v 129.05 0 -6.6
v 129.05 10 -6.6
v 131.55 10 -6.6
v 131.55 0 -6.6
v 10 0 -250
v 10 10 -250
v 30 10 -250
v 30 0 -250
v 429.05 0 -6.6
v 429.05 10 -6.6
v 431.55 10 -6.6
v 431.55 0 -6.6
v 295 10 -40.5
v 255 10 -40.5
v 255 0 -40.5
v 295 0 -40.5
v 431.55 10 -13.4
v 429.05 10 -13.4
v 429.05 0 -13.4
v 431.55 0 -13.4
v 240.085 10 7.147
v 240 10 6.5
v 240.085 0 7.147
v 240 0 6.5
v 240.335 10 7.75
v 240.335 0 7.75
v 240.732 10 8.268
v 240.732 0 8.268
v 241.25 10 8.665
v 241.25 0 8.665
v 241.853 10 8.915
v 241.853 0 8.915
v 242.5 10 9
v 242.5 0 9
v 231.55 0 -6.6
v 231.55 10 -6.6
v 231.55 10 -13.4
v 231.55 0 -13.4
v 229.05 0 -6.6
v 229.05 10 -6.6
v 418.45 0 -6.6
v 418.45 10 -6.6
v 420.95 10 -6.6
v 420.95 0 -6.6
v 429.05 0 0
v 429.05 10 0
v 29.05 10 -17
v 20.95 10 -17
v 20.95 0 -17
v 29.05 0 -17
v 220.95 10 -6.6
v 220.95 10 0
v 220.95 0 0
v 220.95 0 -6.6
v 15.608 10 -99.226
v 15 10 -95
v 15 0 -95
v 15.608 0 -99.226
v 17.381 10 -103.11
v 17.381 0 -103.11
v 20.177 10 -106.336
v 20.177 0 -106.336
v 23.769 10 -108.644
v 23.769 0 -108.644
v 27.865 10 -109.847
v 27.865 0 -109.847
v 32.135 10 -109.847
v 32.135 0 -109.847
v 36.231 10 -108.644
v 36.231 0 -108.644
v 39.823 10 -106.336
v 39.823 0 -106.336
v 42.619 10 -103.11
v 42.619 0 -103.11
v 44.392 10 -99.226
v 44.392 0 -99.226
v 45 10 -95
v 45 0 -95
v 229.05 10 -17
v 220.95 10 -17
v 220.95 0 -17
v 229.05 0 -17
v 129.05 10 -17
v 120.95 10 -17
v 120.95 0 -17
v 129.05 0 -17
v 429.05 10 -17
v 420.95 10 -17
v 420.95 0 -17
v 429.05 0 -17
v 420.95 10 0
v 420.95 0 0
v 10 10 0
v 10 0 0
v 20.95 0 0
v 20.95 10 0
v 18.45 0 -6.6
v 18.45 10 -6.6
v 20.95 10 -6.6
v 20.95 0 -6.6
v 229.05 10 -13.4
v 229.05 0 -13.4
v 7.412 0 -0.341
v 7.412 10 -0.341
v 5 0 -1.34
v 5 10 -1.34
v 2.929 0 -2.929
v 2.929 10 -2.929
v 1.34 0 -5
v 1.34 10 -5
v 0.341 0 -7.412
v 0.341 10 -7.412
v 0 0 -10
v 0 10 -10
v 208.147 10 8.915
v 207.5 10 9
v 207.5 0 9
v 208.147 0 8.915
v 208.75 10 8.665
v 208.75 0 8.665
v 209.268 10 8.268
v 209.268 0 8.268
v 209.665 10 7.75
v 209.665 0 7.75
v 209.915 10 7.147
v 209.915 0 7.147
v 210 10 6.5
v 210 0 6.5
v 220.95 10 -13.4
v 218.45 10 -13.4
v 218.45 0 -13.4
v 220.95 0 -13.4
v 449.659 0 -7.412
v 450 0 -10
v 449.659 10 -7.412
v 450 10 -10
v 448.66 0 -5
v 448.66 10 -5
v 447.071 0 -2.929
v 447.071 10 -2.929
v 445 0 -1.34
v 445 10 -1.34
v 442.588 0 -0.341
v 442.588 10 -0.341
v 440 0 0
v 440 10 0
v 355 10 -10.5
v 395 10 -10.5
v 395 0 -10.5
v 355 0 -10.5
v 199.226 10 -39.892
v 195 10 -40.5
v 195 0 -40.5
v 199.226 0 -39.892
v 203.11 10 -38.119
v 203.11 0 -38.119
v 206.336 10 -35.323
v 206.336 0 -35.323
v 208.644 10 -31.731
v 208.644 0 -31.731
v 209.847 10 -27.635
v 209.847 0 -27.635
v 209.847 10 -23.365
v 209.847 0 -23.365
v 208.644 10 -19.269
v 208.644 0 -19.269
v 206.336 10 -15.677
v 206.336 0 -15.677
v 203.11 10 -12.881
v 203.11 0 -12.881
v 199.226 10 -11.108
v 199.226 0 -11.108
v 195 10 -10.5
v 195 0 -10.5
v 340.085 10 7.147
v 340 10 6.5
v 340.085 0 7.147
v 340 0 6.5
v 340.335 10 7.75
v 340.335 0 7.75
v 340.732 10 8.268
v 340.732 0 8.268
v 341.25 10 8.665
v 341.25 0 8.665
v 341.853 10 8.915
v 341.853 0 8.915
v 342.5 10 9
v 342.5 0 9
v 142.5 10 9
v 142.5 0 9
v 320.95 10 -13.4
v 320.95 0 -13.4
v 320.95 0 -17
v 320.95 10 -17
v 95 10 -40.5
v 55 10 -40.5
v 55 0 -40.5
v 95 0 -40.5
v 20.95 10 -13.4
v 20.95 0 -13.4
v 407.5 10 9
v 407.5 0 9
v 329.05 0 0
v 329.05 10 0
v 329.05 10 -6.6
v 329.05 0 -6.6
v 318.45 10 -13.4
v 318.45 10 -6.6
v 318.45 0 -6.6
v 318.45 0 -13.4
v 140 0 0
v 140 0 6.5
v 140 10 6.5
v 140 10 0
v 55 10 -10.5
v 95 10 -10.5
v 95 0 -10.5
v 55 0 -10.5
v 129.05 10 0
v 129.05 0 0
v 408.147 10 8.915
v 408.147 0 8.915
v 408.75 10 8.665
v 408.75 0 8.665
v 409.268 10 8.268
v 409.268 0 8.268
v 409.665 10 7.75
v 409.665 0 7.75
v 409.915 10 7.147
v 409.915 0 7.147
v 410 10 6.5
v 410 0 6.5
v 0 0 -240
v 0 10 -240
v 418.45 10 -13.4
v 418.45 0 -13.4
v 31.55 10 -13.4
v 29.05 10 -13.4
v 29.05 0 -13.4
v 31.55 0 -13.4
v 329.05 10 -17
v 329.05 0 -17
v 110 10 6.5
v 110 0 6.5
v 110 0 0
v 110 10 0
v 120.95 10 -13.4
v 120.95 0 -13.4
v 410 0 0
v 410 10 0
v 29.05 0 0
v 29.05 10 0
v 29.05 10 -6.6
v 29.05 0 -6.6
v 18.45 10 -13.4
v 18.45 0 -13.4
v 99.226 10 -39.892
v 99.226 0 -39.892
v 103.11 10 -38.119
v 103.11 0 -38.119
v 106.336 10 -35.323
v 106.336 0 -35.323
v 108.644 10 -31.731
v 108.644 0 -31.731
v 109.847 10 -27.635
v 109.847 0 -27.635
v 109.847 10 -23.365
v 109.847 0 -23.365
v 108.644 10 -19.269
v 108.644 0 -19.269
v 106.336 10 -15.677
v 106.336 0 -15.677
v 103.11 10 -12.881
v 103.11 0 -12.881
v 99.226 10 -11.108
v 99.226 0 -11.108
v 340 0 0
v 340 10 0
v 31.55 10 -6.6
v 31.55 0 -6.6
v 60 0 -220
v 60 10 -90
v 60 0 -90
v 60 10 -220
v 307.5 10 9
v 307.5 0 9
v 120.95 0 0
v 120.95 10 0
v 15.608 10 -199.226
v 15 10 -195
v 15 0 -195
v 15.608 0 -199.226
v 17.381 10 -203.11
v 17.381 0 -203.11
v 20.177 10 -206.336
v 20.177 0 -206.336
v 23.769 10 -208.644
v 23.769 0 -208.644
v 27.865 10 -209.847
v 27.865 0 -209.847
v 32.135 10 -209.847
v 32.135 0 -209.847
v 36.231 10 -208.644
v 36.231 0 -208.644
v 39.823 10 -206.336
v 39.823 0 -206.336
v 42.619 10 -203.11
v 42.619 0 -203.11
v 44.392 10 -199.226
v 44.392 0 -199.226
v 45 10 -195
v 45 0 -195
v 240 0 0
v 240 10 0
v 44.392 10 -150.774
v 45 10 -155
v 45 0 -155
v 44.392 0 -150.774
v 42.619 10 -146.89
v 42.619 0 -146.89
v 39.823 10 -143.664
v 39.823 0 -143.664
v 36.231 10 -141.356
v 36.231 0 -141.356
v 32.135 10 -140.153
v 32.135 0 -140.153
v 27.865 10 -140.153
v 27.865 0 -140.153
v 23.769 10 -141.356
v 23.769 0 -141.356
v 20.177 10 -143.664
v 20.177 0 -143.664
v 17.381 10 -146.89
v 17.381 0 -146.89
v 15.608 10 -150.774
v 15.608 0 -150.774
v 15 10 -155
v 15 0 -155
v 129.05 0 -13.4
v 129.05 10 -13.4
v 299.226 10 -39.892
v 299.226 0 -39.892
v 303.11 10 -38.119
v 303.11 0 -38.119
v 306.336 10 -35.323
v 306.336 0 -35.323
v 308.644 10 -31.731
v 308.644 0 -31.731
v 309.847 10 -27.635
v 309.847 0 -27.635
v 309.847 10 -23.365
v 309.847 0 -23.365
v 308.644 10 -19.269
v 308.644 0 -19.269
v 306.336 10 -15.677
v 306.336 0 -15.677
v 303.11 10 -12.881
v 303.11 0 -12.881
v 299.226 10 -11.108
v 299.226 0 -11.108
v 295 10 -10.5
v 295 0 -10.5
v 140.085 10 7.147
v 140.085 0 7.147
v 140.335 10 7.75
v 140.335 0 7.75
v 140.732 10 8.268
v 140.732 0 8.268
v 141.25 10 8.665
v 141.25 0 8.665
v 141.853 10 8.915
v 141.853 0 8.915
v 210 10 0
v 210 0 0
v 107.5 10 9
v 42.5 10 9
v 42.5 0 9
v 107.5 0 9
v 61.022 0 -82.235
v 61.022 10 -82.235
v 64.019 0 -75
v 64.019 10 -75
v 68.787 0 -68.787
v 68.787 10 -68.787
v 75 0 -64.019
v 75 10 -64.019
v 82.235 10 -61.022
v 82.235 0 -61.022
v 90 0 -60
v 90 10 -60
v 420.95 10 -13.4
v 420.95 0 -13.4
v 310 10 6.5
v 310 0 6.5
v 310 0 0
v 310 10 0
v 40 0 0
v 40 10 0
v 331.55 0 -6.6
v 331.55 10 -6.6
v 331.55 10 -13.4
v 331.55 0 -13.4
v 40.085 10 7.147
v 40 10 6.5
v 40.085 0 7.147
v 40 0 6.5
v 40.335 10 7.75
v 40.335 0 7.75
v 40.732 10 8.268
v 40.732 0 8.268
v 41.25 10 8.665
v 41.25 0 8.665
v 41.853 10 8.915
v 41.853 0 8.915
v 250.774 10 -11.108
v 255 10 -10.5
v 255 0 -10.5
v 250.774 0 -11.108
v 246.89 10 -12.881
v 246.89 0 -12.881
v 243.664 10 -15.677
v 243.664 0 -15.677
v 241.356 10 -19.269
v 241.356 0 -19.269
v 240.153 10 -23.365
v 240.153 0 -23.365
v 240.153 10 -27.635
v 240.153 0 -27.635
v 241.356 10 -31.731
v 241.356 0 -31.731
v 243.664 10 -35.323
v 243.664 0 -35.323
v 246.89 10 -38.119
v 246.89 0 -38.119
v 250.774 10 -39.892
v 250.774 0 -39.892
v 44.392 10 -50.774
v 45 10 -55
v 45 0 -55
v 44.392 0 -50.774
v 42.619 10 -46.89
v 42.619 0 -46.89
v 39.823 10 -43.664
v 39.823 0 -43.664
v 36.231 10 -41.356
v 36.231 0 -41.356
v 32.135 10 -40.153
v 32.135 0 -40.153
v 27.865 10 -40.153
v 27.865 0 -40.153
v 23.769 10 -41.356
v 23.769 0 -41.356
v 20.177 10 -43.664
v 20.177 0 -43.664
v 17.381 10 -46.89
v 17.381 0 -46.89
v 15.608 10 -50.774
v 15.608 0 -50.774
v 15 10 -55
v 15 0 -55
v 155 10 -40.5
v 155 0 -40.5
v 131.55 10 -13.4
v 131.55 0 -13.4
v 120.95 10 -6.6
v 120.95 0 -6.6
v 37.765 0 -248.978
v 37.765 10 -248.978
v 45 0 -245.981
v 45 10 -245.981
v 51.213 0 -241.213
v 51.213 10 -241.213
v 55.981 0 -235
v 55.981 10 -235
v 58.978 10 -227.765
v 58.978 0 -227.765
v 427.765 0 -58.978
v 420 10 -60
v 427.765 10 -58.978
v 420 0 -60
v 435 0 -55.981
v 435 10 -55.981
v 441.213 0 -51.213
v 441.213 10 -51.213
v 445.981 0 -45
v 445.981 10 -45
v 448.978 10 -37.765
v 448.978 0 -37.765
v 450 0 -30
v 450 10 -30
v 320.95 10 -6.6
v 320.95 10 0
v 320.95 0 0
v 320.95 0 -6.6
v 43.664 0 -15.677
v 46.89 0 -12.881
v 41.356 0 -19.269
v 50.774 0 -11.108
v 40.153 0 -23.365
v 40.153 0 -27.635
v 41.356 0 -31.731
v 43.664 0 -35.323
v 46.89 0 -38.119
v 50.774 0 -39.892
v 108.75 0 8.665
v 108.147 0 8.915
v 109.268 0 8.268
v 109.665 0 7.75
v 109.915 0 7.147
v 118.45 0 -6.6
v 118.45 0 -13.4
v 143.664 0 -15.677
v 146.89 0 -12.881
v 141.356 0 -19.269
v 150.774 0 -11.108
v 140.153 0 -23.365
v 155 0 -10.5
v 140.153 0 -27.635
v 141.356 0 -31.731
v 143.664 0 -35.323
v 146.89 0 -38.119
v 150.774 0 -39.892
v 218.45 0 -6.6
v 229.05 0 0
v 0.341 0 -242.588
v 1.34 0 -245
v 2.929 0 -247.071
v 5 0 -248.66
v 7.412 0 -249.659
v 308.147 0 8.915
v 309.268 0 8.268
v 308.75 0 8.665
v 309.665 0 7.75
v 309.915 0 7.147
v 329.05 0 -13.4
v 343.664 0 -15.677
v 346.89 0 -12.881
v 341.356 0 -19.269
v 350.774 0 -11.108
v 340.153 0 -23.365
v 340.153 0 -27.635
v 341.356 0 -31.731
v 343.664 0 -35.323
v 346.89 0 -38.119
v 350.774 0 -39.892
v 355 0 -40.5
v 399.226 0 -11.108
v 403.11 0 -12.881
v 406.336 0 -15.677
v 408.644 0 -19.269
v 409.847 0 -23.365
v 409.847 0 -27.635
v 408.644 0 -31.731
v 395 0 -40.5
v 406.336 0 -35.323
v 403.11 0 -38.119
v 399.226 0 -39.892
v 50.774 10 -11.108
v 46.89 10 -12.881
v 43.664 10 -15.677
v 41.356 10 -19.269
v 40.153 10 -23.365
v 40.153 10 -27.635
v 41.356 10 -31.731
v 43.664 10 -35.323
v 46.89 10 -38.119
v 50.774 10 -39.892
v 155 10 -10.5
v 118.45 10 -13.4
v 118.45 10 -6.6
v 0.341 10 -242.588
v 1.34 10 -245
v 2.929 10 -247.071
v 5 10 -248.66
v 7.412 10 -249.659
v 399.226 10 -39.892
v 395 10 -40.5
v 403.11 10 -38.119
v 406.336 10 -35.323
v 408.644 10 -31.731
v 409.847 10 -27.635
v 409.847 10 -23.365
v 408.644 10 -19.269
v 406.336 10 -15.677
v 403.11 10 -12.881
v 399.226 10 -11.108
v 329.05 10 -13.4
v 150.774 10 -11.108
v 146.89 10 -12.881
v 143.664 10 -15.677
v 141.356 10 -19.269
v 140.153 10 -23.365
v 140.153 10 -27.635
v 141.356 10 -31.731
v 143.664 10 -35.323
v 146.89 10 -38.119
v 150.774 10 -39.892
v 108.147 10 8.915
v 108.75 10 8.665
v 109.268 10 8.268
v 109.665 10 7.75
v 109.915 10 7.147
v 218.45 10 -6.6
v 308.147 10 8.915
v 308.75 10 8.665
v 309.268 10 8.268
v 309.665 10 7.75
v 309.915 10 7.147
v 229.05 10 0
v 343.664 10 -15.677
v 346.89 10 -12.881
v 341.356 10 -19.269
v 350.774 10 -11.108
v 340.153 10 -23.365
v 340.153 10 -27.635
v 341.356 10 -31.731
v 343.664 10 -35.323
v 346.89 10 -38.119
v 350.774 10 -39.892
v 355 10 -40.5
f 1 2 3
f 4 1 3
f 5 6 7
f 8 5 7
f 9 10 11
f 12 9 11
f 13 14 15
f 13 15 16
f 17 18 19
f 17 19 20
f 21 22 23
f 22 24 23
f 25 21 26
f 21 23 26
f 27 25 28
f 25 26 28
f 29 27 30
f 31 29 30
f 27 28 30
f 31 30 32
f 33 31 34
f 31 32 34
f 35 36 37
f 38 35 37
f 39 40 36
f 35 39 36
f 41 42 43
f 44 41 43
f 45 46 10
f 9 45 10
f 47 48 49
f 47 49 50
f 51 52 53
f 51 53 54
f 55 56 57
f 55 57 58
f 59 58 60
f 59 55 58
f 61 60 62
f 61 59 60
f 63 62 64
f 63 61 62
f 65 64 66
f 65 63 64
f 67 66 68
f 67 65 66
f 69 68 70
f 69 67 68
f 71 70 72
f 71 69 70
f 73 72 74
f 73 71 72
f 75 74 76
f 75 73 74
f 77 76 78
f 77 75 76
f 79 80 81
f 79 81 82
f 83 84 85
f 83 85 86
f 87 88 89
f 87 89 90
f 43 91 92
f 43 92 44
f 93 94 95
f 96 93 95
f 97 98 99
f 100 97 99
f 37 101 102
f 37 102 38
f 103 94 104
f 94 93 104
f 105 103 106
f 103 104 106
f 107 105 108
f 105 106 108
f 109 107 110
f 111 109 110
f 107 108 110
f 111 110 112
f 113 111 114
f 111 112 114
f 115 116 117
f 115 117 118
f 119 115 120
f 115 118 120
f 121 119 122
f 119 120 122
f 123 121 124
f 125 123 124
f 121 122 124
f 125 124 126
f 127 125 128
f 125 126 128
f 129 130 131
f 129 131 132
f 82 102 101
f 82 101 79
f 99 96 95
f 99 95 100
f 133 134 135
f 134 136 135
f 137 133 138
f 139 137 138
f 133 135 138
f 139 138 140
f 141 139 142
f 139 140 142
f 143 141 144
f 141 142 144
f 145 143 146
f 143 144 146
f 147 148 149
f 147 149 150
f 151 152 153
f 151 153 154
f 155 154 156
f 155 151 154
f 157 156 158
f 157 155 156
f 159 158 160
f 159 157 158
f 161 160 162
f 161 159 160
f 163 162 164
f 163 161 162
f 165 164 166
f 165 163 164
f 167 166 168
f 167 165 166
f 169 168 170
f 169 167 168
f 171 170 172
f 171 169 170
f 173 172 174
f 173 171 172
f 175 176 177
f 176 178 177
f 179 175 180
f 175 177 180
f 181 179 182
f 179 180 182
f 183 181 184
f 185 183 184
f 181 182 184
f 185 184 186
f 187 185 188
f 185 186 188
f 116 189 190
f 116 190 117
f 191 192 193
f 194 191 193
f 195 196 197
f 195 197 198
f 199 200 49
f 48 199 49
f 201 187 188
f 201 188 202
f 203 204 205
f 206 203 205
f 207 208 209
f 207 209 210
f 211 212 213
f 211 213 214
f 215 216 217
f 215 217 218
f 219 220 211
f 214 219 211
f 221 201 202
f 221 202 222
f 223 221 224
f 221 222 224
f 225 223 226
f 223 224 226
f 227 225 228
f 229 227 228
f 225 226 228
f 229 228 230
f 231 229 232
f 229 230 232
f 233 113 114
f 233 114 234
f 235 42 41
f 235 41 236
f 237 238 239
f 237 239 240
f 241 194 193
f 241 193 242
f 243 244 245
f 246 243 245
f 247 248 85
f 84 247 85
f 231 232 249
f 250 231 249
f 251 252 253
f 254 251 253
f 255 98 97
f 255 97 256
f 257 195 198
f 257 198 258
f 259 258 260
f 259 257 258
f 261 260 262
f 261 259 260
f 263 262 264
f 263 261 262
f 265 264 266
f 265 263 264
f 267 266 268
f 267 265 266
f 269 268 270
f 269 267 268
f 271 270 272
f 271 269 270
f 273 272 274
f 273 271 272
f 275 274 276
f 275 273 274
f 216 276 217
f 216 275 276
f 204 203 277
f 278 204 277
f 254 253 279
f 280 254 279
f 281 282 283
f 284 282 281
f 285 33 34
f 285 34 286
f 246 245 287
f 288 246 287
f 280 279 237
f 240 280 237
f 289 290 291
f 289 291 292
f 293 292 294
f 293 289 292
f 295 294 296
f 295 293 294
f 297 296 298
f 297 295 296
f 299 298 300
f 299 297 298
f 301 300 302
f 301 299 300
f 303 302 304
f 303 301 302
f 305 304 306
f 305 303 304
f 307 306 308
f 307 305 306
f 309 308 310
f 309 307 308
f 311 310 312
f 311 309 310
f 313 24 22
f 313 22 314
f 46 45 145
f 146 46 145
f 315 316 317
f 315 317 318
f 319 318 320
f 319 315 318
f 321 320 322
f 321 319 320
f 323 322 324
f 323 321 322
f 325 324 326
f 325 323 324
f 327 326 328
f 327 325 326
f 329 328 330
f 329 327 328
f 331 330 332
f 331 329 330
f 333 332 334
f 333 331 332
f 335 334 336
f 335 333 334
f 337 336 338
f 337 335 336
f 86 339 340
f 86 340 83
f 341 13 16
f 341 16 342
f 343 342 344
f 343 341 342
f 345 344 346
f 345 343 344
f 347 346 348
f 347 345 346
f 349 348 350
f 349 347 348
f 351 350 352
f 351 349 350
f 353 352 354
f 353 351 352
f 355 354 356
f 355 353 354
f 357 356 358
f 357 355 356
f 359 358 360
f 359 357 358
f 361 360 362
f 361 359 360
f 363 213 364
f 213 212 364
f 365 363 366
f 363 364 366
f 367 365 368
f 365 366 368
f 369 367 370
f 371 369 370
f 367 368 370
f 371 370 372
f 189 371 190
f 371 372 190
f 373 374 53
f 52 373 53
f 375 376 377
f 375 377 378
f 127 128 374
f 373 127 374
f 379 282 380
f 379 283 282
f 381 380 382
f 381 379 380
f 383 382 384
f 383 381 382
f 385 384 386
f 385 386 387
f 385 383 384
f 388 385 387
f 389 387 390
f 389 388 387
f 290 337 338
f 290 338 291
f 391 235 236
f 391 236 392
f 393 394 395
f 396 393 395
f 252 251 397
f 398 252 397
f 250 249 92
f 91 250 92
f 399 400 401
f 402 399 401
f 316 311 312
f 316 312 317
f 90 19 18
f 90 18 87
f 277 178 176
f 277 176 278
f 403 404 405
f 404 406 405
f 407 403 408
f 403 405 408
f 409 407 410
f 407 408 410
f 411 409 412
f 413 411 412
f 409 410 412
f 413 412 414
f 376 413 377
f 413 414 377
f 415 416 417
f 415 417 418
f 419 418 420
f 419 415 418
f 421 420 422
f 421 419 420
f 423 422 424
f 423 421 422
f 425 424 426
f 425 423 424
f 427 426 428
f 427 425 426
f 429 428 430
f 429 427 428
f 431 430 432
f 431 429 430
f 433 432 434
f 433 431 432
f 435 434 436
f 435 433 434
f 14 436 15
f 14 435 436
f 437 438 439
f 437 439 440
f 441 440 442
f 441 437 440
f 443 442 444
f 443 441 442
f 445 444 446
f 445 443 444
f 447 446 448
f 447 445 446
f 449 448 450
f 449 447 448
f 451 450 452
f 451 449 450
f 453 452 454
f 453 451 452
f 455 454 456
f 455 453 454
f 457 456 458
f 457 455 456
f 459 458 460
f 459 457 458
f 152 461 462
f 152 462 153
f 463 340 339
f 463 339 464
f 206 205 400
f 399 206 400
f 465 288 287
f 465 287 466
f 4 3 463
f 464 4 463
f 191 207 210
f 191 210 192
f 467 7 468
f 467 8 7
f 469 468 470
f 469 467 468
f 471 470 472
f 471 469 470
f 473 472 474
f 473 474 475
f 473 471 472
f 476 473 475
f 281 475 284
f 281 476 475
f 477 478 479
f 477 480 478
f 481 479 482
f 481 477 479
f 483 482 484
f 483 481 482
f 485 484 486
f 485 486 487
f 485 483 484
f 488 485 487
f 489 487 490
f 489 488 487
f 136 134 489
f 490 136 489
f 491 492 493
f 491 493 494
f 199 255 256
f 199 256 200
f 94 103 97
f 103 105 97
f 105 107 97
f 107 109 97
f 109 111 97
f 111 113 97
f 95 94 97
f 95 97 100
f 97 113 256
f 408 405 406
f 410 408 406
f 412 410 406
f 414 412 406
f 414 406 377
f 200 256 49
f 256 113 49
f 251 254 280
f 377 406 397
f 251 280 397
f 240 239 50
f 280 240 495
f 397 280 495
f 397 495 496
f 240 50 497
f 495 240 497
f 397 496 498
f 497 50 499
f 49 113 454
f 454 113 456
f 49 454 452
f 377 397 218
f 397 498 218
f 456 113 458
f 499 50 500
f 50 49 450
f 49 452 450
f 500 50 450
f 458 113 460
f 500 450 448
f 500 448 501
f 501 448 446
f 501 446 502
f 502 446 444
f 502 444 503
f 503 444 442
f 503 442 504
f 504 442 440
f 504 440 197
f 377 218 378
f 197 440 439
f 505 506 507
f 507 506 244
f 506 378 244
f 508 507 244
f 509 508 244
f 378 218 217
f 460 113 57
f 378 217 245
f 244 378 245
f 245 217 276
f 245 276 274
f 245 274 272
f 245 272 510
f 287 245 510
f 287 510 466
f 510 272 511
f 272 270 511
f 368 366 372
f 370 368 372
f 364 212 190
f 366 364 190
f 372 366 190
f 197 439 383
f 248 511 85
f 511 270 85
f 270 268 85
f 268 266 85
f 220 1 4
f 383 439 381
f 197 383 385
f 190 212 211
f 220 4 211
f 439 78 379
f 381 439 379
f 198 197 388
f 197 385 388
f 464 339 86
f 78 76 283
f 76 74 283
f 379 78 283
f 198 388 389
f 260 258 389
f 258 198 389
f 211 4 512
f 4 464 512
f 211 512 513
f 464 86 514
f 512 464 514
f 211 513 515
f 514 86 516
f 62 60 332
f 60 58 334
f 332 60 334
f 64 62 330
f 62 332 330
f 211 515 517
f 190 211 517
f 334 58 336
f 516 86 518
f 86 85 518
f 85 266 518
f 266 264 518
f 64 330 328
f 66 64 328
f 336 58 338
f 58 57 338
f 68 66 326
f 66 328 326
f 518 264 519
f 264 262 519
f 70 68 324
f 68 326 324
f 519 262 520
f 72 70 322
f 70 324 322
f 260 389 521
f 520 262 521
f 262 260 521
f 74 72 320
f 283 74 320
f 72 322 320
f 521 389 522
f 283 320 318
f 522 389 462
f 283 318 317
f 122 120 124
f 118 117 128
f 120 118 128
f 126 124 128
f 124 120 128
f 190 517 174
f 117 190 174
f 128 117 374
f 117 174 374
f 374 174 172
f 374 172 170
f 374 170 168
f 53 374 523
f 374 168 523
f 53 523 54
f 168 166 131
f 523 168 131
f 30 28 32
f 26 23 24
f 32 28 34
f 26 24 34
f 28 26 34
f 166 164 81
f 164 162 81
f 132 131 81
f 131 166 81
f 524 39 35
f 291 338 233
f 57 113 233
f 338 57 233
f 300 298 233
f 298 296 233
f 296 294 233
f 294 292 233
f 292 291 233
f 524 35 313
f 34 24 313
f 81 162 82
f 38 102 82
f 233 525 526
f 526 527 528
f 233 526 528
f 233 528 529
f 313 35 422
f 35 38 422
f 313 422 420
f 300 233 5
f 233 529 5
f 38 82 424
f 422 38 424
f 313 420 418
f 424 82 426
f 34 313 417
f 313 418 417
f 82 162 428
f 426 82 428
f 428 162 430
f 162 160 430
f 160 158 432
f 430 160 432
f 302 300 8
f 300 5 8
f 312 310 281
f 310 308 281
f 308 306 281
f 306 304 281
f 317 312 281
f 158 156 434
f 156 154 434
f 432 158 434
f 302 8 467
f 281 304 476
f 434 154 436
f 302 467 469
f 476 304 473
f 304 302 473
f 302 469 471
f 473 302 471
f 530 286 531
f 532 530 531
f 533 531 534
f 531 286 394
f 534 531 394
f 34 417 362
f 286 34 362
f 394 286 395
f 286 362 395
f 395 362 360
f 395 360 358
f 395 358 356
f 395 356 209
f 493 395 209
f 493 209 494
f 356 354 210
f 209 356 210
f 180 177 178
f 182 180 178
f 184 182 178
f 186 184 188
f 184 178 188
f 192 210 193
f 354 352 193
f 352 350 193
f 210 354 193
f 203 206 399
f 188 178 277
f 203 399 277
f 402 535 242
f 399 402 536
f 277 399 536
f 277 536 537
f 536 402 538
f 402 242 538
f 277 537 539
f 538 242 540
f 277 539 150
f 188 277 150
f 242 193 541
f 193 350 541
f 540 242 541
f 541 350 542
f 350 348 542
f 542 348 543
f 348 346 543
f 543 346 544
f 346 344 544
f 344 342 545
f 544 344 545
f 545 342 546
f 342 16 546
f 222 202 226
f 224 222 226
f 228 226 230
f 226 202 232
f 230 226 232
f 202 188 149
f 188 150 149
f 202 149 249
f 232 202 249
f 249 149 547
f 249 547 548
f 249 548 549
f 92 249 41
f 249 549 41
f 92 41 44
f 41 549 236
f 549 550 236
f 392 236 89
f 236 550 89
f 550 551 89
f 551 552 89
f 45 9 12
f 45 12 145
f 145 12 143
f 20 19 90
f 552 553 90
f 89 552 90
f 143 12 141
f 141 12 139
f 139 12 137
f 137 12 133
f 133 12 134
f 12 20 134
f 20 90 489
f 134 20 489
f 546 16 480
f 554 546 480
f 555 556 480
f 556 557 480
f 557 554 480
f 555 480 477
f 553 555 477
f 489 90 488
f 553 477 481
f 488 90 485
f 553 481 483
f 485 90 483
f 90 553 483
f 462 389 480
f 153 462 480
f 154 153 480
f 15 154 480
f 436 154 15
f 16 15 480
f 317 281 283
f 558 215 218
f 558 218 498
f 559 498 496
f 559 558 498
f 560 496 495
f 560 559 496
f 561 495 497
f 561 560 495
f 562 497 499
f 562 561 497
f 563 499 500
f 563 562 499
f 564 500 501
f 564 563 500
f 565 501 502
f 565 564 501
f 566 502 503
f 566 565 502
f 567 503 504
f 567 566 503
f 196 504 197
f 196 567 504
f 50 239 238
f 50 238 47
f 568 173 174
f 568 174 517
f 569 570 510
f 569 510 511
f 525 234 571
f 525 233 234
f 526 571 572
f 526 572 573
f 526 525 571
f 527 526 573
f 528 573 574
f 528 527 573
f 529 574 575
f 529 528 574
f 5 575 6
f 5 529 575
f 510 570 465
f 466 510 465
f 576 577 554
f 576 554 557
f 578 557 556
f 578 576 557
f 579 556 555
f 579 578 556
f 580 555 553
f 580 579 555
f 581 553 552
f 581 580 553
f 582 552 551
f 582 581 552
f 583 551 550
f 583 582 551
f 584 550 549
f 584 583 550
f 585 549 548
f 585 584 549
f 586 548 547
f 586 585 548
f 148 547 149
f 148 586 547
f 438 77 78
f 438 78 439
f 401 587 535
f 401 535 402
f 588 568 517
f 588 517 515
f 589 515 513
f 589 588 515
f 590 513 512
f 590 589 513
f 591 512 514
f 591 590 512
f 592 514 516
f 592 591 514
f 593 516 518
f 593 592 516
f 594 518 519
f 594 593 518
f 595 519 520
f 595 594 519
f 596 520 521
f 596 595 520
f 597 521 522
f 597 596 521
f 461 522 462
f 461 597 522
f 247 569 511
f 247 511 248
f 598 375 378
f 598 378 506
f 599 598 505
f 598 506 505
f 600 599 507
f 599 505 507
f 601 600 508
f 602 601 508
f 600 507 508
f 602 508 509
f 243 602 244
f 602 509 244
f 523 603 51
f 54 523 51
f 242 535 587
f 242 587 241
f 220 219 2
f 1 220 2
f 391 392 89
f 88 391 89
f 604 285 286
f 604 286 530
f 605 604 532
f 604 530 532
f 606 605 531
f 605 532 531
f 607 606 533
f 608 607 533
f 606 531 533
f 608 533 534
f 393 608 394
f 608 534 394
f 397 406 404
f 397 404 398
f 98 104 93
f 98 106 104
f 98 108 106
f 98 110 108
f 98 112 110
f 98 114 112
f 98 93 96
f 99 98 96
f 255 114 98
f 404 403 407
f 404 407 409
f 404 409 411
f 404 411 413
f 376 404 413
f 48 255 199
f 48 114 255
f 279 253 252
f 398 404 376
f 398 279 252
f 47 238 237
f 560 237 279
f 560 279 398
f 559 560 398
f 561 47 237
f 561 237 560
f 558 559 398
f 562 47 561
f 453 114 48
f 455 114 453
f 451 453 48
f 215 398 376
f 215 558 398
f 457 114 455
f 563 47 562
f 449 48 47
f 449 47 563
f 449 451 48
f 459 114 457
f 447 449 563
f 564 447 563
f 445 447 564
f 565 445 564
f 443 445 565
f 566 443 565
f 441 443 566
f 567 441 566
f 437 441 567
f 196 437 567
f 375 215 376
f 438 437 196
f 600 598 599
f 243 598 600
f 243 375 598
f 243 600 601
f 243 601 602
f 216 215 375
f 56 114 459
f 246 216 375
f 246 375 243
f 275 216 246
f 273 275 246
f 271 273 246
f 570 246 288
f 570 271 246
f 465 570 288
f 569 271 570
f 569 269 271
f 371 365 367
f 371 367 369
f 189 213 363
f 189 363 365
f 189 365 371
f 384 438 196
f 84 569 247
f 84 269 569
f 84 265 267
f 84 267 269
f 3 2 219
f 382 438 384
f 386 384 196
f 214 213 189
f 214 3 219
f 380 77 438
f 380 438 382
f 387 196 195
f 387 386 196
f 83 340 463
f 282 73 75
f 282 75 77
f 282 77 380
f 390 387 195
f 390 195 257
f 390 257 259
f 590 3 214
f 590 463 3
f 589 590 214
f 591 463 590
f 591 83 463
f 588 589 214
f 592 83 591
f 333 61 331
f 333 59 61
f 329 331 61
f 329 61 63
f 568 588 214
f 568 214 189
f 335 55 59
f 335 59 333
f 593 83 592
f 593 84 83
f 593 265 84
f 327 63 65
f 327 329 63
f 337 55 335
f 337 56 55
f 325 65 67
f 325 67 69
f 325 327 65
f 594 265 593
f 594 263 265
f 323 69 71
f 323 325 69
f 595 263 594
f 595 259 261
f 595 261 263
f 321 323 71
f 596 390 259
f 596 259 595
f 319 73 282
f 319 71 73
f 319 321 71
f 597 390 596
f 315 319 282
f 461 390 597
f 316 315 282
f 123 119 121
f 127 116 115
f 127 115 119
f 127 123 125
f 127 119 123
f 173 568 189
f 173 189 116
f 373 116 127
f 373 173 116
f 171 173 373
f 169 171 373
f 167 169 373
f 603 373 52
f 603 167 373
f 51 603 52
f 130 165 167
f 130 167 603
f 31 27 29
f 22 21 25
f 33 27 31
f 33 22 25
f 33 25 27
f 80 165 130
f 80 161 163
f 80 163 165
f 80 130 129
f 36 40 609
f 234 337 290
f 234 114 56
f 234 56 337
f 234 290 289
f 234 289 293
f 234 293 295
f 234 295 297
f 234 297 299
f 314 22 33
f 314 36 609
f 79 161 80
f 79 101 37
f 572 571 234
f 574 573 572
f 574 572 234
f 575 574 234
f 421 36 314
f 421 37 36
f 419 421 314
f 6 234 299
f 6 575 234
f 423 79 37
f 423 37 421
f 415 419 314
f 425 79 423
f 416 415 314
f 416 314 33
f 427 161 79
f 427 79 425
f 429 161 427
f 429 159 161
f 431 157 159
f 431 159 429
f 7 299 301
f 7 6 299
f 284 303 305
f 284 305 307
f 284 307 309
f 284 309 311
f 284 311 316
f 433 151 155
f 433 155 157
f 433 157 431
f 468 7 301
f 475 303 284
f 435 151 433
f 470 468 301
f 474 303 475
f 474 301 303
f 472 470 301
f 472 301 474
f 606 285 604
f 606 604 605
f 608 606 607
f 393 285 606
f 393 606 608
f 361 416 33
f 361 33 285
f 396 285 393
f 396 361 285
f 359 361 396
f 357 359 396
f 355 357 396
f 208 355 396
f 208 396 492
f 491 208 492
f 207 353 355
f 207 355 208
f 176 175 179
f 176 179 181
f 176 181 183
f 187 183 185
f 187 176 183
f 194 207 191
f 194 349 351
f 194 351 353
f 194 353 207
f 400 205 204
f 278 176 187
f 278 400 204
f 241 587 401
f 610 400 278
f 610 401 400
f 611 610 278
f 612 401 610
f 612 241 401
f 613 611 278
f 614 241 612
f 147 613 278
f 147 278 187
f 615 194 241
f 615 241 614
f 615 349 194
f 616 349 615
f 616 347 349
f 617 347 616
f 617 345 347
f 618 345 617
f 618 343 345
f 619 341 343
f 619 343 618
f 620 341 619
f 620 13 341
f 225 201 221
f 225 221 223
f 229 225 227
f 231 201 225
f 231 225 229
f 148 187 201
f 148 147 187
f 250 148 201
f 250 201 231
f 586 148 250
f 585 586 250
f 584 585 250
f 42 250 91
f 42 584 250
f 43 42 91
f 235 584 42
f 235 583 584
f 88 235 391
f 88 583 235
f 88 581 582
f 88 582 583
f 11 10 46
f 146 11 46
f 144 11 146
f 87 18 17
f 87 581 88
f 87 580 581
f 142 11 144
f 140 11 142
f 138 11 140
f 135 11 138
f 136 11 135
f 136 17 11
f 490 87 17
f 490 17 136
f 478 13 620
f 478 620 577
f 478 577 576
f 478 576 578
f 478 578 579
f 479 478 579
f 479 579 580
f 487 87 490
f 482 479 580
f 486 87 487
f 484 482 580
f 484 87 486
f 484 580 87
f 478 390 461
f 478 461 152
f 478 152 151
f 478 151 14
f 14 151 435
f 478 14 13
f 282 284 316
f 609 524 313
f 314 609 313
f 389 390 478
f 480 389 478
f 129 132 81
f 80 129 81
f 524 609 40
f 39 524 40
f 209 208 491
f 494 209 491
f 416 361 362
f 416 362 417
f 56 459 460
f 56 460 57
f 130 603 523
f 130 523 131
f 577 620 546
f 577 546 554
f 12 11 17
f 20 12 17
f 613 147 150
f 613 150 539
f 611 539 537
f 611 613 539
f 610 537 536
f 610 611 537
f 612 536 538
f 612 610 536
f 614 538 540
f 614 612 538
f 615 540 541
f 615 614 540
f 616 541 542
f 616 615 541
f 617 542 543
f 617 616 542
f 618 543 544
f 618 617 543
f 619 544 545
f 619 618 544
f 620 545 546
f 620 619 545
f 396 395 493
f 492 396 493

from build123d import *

# Parameters (mm, degrees)
SKETCH1_W              = 450
SKETCH1_H              = 450
BOSS_EXTRUDE1_DEPTH    = 10
SKETCH2_W              = 8.1
SKETCH2_H              = 27
SKETCH2_W_2            = 13.1
SKETCH2_H_2            = 6.8
CUT_EXTRUDE1_DEPTH     = 637.474665639
LPATTERN1_COUNT        = 3
LPATTERN1_PITCH        = 100
LPATTERN1_COL_COUNT    = 3
LPATTERN1_COL_PITCH    = 100
SKETCH3_W              = 70
SKETCH3_H              = 9
BOSS_EXTRUDE2_DEPTH    = 10
FILLET1_R              = 2.5
LPATTERN2_COUNT        = 4
LPATTERN2_PITCH        = 100
FILLET1_OF_LPATTERN2_R = 2.5
SKETCH4_W              = 390
SKETCH4_H              = 390
SKETCH4_W_2            = 60
SKETCH4_H_2            = 200
CUT_EXTRUDE2_DEPTH     = 637.474665639
CUT_EXTRUDE3_DEPTH     = 515.878626474
FILLET2_R              = 10
FILLET3_R              = 30


with BuildPart() as part:
    # Sketch1 → Boss-Extrude1 (new body)
    with BuildSketch(Plane(origin=(0, 0, 0), x_dir=(1, 0, 0), z_dir=(0, 1, 0))):
        with Locations((225, 225)):
            Rectangle(SKETCH1_W, SKETCH1_H)
    extrude(amount=BOSS_EXTRUDE1_DEPTH)

    # Sketch2 → Cut-Extrude1 (cut, through all)
    with BuildSketch(Plane(origin=(0, 10, 0), x_dir=(1, 0, 0), z_dir=(0, 1, 0))):
        with Locations((225, 3.5)):
            Rectangle(SKETCH2_W, SKETCH2_H)
        with Locations((225, 10)):
            Rectangle(SKETCH2_W_2, SKETCH2_H_2)
    cut_extrude1 = extrude(amount=-CUT_EXTRUDE1_DEPTH, mode=Mode.SUBTRACT)

    # LPattern1: Cut-Extrude1 ×3
    with Locations(*[(-i * LPATTERN1_PITCH, 0, 0) for i in range(1, LPATTERN1_COUNT)]):
        add(cut_extrude1, mode=Mode.SUBTRACT)

    # LPattern1 col: Cut-Extrude1 ×3
    with Locations(*[(i * LPATTERN1_COL_PITCH, 0, 0) for i in range(1, LPATTERN1_COL_COUNT)]):
        add(cut_extrude1, mode=Mode.SUBTRACT)

    # Sketch3 → Boss-Extrude2 (add)
    with BuildSketch(Plane(origin=(0, 10, 0), x_dir=(1, 0, 0), z_dir=(0, 1, 0))):
        with Locations((75, -4.5)):
            Rectangle(SKETCH3_W, SKETCH3_H)
    boss_extrude2 = extrude(amount=-BOSS_EXTRUDE2_DEPTH)

    # Fillet1
    fillet1_edges = [part.edges().sort_by_distance(p)[0] for p in [
        (110, 5, 9),
        (40, 5, 9),
    ]]
    fillet(fillet1_edges, radius=FILLET1_R)

    # LPattern2: Boss-Extrude2 ×4
    with Locations(*[(i * LPATTERN2_PITCH, 0, 0) for i in range(1, LPATTERN2_COUNT)]):
        add(boss_extrude2)

    # Fillet1 of LPattern2
    fillet1_of_lpattern2_edges = [part.edges().sort_by_distance(p)[0] for p in [
        (210, 5, 9),
        (140, 5, 9),
        (310, 5, 9),
        (240, 5, 9),
        (410, 5, 9),
        (340, 5, 9),
    ]]
    fillet(fillet1_of_lpattern2_edges, radius=FILLET1_OF_LPATTERN2_R)

    # Sketch4 → Cut-Extrude2 (cut, through all)
    with BuildSketch(Plane(origin=(0, 10, 0), x_dir=(1, 0, 0), z_dir=(0, 1, 0))):
        with Locations((255, 255)):
            Rectangle(SKETCH4_W, SKETCH4_H)
        with Locations((30, 350)):
            Rectangle(SKETCH4_W_2, SKETCH4_H_2)
    extrude(amount=-CUT_EXTRUDE2_DEPTH, mode=Mode.SUBTRACT)

    # Sketch5 → Cut-Extrude3 (cut, through all)
    with BuildSketch(Plane(origin=(0, 10, 0), x_dir=(1, 0, 0), z_dir=(0, 1, 0))):
        with BuildLine():
            Line((55, 40.5), (95, 40.5))
            ThreePointArc((95, 40.5), (110, 25.5), (95, 10.5))
            Line((95, 10.5), (55, 10.5))
            ThreePointArc((55, 10.5), (40, 25.5), (55, 40.5))
        make_face()
        with BuildLine():
            Line((155, 40.5), (195, 40.5))
            ThreePointArc((195, 40.5), (210, 25.5), (195, 10.5))
            Line((195, 10.5), (155, 10.5))
            ThreePointArc((155, 10.5), (140, 25.5), (155, 40.5))
        make_face()
        with BuildLine():
            Line((255, 40.5), (295, 40.5))
            ThreePointArc((295, 40.5), (310, 25.5), (295, 10.5))
            Line((295, 10.5), (255, 10.5))
            ThreePointArc((255, 10.5), (240, 25.5), (255, 40.5))
        make_face()
        with BuildLine():
            Line((355, 40.5), (395, 40.5))
            ThreePointArc((395, 40.5), (410, 25.5), (395, 10.5))
            Line((395, 10.5), (355, 10.5))
            ThreePointArc((355, 10.5), (340, 25.5), (355, 40.5))
        make_face()
        with BuildLine():
            Line((15, 55), (15, 95))
            ThreePointArc((15, 95), (30, 110), (45, 95))
            Line((45, 95), (45, 55))
            ThreePointArc((45, 55), (30, 40), (15, 55))
        make_face()
        with BuildLine():
            Line((45, 195), (45, 155))
            ThreePointArc((45, 155), (30, 140), (15, 155))
            Line((15, 155), (15, 195))
            ThreePointArc((15, 195), (30, 210), (45, 195))
        make_face()
    extrude(amount=-CUT_EXTRUDE3_DEPTH, mode=Mode.SUBTRACT)

    # Fillet2
    fillet2_edges = [part.edges().sort_by_distance(p)[0] for p in [
        (0, 5, -250),
        (450, 5, 0),
        (0, 5, 0),
    ]]
    fillet(fillet2_edges, radius=FILLET2_R)

    # Fillet3
    fillet3_edges = [part.edges().sort_by_distance(p)[0] for p in [
        (450, 5, -60),
        (60, 5, -60),
        (60, 5, -250),
    ]]
    fillet(fillet3_edges, radius=FILLET3_R)


solid = part.part
